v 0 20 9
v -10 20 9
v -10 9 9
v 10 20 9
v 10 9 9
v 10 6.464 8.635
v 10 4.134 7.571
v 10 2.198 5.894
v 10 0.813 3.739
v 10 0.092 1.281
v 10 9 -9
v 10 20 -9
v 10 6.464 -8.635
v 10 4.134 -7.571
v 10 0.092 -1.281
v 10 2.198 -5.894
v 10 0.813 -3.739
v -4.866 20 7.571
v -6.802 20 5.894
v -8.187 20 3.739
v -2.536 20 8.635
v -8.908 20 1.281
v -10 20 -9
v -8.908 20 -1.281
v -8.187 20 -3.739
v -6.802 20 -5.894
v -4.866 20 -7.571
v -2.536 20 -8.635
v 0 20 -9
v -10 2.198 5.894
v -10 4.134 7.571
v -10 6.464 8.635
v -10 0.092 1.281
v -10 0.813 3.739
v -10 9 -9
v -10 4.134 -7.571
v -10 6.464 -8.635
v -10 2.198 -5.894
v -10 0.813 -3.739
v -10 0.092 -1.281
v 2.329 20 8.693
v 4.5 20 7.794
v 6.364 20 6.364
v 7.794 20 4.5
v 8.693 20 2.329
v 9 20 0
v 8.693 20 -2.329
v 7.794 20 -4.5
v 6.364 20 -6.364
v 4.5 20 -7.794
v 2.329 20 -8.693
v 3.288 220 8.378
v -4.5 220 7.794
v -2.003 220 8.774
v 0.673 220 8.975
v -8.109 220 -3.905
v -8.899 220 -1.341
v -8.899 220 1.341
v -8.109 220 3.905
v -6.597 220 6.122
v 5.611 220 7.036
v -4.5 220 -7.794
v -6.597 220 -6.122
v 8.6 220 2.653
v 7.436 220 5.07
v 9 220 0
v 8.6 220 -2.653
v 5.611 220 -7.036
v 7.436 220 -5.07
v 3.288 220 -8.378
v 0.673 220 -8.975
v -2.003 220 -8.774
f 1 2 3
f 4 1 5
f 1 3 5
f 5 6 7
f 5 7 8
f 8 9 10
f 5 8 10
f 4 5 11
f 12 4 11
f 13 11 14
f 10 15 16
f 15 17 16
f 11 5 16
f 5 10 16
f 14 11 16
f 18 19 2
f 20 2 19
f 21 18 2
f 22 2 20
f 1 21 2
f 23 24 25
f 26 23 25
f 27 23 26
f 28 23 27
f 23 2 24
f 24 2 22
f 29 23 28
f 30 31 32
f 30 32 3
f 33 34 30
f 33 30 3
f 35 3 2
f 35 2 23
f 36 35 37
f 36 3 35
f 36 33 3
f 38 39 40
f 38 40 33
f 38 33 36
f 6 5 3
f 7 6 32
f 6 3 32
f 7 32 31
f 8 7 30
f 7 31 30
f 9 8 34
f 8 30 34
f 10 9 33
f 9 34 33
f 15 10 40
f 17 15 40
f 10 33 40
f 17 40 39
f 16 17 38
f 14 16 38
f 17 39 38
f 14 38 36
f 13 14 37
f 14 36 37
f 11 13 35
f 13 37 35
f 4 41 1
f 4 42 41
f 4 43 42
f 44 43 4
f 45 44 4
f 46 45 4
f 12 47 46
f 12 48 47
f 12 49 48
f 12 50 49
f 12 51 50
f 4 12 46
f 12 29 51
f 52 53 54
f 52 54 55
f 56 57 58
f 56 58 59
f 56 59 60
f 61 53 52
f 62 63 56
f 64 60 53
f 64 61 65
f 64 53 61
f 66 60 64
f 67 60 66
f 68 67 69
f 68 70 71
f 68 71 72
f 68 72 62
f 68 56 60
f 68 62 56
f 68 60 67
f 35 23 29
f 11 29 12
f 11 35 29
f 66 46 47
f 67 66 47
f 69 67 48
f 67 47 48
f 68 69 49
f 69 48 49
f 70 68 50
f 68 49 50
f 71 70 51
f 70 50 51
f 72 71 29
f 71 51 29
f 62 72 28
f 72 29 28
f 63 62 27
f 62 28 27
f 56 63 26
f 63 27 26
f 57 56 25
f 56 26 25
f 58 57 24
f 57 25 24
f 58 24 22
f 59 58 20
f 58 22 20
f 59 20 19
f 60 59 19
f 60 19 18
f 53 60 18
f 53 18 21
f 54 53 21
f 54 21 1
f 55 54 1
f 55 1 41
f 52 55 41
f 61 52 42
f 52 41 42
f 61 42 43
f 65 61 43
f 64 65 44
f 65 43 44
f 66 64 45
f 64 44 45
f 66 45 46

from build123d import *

# Parameters (mm, degrees)
SKETCH_1_W          = 20
SKETCH_1_H          = 18
EXTRUDE_1_DEPTH     = 20
SKETCH_2_R          = 9
EXTRUDE_2_DEPTH     = 200
CUT_EXTRUDE_1_DEPTH = 100


with BuildPart() as part:
    # 草图1 → 凸台-拉伸1 (new body)
    with BuildSketch(Plane(origin=(0, 0, 0), x_dir=(1, 0, 0), z_dir=(0, 1, 0))):
        Rectangle(SKETCH_1_W, SKETCH_1_H)
    extrude(amount=EXTRUDE_1_DEPTH)

    # 草图2 → 凸台-拉伸2 (add)
    with BuildSketch(Plane(origin=(0, 20, 0), x_dir=(1, 0, 0), z_dir=(0, 1, 0))):
        Circle(SKETCH_2_R)
    extrude(amount=EXTRUDE_2_DEPTH)

    # 草图3 → 切除-拉伸1 (cut)
    with BuildSketch(Plane.ZY.offset(10)):
        with BuildLine():
            Line((-9, 9), (-9, -3.669557505))
            Line((-9, -3.669557505), (9, -3.669557505))
            Line((9, -3.669557505), (9, 9))
            ThreePointArc((9, 9), (0, 0), (-9, 9))
        make_face()
    extrude(amount=-CUT_EXTRUDE_1_DEPTH, mode=Mode.SUBTRACT)


solid = part.part
